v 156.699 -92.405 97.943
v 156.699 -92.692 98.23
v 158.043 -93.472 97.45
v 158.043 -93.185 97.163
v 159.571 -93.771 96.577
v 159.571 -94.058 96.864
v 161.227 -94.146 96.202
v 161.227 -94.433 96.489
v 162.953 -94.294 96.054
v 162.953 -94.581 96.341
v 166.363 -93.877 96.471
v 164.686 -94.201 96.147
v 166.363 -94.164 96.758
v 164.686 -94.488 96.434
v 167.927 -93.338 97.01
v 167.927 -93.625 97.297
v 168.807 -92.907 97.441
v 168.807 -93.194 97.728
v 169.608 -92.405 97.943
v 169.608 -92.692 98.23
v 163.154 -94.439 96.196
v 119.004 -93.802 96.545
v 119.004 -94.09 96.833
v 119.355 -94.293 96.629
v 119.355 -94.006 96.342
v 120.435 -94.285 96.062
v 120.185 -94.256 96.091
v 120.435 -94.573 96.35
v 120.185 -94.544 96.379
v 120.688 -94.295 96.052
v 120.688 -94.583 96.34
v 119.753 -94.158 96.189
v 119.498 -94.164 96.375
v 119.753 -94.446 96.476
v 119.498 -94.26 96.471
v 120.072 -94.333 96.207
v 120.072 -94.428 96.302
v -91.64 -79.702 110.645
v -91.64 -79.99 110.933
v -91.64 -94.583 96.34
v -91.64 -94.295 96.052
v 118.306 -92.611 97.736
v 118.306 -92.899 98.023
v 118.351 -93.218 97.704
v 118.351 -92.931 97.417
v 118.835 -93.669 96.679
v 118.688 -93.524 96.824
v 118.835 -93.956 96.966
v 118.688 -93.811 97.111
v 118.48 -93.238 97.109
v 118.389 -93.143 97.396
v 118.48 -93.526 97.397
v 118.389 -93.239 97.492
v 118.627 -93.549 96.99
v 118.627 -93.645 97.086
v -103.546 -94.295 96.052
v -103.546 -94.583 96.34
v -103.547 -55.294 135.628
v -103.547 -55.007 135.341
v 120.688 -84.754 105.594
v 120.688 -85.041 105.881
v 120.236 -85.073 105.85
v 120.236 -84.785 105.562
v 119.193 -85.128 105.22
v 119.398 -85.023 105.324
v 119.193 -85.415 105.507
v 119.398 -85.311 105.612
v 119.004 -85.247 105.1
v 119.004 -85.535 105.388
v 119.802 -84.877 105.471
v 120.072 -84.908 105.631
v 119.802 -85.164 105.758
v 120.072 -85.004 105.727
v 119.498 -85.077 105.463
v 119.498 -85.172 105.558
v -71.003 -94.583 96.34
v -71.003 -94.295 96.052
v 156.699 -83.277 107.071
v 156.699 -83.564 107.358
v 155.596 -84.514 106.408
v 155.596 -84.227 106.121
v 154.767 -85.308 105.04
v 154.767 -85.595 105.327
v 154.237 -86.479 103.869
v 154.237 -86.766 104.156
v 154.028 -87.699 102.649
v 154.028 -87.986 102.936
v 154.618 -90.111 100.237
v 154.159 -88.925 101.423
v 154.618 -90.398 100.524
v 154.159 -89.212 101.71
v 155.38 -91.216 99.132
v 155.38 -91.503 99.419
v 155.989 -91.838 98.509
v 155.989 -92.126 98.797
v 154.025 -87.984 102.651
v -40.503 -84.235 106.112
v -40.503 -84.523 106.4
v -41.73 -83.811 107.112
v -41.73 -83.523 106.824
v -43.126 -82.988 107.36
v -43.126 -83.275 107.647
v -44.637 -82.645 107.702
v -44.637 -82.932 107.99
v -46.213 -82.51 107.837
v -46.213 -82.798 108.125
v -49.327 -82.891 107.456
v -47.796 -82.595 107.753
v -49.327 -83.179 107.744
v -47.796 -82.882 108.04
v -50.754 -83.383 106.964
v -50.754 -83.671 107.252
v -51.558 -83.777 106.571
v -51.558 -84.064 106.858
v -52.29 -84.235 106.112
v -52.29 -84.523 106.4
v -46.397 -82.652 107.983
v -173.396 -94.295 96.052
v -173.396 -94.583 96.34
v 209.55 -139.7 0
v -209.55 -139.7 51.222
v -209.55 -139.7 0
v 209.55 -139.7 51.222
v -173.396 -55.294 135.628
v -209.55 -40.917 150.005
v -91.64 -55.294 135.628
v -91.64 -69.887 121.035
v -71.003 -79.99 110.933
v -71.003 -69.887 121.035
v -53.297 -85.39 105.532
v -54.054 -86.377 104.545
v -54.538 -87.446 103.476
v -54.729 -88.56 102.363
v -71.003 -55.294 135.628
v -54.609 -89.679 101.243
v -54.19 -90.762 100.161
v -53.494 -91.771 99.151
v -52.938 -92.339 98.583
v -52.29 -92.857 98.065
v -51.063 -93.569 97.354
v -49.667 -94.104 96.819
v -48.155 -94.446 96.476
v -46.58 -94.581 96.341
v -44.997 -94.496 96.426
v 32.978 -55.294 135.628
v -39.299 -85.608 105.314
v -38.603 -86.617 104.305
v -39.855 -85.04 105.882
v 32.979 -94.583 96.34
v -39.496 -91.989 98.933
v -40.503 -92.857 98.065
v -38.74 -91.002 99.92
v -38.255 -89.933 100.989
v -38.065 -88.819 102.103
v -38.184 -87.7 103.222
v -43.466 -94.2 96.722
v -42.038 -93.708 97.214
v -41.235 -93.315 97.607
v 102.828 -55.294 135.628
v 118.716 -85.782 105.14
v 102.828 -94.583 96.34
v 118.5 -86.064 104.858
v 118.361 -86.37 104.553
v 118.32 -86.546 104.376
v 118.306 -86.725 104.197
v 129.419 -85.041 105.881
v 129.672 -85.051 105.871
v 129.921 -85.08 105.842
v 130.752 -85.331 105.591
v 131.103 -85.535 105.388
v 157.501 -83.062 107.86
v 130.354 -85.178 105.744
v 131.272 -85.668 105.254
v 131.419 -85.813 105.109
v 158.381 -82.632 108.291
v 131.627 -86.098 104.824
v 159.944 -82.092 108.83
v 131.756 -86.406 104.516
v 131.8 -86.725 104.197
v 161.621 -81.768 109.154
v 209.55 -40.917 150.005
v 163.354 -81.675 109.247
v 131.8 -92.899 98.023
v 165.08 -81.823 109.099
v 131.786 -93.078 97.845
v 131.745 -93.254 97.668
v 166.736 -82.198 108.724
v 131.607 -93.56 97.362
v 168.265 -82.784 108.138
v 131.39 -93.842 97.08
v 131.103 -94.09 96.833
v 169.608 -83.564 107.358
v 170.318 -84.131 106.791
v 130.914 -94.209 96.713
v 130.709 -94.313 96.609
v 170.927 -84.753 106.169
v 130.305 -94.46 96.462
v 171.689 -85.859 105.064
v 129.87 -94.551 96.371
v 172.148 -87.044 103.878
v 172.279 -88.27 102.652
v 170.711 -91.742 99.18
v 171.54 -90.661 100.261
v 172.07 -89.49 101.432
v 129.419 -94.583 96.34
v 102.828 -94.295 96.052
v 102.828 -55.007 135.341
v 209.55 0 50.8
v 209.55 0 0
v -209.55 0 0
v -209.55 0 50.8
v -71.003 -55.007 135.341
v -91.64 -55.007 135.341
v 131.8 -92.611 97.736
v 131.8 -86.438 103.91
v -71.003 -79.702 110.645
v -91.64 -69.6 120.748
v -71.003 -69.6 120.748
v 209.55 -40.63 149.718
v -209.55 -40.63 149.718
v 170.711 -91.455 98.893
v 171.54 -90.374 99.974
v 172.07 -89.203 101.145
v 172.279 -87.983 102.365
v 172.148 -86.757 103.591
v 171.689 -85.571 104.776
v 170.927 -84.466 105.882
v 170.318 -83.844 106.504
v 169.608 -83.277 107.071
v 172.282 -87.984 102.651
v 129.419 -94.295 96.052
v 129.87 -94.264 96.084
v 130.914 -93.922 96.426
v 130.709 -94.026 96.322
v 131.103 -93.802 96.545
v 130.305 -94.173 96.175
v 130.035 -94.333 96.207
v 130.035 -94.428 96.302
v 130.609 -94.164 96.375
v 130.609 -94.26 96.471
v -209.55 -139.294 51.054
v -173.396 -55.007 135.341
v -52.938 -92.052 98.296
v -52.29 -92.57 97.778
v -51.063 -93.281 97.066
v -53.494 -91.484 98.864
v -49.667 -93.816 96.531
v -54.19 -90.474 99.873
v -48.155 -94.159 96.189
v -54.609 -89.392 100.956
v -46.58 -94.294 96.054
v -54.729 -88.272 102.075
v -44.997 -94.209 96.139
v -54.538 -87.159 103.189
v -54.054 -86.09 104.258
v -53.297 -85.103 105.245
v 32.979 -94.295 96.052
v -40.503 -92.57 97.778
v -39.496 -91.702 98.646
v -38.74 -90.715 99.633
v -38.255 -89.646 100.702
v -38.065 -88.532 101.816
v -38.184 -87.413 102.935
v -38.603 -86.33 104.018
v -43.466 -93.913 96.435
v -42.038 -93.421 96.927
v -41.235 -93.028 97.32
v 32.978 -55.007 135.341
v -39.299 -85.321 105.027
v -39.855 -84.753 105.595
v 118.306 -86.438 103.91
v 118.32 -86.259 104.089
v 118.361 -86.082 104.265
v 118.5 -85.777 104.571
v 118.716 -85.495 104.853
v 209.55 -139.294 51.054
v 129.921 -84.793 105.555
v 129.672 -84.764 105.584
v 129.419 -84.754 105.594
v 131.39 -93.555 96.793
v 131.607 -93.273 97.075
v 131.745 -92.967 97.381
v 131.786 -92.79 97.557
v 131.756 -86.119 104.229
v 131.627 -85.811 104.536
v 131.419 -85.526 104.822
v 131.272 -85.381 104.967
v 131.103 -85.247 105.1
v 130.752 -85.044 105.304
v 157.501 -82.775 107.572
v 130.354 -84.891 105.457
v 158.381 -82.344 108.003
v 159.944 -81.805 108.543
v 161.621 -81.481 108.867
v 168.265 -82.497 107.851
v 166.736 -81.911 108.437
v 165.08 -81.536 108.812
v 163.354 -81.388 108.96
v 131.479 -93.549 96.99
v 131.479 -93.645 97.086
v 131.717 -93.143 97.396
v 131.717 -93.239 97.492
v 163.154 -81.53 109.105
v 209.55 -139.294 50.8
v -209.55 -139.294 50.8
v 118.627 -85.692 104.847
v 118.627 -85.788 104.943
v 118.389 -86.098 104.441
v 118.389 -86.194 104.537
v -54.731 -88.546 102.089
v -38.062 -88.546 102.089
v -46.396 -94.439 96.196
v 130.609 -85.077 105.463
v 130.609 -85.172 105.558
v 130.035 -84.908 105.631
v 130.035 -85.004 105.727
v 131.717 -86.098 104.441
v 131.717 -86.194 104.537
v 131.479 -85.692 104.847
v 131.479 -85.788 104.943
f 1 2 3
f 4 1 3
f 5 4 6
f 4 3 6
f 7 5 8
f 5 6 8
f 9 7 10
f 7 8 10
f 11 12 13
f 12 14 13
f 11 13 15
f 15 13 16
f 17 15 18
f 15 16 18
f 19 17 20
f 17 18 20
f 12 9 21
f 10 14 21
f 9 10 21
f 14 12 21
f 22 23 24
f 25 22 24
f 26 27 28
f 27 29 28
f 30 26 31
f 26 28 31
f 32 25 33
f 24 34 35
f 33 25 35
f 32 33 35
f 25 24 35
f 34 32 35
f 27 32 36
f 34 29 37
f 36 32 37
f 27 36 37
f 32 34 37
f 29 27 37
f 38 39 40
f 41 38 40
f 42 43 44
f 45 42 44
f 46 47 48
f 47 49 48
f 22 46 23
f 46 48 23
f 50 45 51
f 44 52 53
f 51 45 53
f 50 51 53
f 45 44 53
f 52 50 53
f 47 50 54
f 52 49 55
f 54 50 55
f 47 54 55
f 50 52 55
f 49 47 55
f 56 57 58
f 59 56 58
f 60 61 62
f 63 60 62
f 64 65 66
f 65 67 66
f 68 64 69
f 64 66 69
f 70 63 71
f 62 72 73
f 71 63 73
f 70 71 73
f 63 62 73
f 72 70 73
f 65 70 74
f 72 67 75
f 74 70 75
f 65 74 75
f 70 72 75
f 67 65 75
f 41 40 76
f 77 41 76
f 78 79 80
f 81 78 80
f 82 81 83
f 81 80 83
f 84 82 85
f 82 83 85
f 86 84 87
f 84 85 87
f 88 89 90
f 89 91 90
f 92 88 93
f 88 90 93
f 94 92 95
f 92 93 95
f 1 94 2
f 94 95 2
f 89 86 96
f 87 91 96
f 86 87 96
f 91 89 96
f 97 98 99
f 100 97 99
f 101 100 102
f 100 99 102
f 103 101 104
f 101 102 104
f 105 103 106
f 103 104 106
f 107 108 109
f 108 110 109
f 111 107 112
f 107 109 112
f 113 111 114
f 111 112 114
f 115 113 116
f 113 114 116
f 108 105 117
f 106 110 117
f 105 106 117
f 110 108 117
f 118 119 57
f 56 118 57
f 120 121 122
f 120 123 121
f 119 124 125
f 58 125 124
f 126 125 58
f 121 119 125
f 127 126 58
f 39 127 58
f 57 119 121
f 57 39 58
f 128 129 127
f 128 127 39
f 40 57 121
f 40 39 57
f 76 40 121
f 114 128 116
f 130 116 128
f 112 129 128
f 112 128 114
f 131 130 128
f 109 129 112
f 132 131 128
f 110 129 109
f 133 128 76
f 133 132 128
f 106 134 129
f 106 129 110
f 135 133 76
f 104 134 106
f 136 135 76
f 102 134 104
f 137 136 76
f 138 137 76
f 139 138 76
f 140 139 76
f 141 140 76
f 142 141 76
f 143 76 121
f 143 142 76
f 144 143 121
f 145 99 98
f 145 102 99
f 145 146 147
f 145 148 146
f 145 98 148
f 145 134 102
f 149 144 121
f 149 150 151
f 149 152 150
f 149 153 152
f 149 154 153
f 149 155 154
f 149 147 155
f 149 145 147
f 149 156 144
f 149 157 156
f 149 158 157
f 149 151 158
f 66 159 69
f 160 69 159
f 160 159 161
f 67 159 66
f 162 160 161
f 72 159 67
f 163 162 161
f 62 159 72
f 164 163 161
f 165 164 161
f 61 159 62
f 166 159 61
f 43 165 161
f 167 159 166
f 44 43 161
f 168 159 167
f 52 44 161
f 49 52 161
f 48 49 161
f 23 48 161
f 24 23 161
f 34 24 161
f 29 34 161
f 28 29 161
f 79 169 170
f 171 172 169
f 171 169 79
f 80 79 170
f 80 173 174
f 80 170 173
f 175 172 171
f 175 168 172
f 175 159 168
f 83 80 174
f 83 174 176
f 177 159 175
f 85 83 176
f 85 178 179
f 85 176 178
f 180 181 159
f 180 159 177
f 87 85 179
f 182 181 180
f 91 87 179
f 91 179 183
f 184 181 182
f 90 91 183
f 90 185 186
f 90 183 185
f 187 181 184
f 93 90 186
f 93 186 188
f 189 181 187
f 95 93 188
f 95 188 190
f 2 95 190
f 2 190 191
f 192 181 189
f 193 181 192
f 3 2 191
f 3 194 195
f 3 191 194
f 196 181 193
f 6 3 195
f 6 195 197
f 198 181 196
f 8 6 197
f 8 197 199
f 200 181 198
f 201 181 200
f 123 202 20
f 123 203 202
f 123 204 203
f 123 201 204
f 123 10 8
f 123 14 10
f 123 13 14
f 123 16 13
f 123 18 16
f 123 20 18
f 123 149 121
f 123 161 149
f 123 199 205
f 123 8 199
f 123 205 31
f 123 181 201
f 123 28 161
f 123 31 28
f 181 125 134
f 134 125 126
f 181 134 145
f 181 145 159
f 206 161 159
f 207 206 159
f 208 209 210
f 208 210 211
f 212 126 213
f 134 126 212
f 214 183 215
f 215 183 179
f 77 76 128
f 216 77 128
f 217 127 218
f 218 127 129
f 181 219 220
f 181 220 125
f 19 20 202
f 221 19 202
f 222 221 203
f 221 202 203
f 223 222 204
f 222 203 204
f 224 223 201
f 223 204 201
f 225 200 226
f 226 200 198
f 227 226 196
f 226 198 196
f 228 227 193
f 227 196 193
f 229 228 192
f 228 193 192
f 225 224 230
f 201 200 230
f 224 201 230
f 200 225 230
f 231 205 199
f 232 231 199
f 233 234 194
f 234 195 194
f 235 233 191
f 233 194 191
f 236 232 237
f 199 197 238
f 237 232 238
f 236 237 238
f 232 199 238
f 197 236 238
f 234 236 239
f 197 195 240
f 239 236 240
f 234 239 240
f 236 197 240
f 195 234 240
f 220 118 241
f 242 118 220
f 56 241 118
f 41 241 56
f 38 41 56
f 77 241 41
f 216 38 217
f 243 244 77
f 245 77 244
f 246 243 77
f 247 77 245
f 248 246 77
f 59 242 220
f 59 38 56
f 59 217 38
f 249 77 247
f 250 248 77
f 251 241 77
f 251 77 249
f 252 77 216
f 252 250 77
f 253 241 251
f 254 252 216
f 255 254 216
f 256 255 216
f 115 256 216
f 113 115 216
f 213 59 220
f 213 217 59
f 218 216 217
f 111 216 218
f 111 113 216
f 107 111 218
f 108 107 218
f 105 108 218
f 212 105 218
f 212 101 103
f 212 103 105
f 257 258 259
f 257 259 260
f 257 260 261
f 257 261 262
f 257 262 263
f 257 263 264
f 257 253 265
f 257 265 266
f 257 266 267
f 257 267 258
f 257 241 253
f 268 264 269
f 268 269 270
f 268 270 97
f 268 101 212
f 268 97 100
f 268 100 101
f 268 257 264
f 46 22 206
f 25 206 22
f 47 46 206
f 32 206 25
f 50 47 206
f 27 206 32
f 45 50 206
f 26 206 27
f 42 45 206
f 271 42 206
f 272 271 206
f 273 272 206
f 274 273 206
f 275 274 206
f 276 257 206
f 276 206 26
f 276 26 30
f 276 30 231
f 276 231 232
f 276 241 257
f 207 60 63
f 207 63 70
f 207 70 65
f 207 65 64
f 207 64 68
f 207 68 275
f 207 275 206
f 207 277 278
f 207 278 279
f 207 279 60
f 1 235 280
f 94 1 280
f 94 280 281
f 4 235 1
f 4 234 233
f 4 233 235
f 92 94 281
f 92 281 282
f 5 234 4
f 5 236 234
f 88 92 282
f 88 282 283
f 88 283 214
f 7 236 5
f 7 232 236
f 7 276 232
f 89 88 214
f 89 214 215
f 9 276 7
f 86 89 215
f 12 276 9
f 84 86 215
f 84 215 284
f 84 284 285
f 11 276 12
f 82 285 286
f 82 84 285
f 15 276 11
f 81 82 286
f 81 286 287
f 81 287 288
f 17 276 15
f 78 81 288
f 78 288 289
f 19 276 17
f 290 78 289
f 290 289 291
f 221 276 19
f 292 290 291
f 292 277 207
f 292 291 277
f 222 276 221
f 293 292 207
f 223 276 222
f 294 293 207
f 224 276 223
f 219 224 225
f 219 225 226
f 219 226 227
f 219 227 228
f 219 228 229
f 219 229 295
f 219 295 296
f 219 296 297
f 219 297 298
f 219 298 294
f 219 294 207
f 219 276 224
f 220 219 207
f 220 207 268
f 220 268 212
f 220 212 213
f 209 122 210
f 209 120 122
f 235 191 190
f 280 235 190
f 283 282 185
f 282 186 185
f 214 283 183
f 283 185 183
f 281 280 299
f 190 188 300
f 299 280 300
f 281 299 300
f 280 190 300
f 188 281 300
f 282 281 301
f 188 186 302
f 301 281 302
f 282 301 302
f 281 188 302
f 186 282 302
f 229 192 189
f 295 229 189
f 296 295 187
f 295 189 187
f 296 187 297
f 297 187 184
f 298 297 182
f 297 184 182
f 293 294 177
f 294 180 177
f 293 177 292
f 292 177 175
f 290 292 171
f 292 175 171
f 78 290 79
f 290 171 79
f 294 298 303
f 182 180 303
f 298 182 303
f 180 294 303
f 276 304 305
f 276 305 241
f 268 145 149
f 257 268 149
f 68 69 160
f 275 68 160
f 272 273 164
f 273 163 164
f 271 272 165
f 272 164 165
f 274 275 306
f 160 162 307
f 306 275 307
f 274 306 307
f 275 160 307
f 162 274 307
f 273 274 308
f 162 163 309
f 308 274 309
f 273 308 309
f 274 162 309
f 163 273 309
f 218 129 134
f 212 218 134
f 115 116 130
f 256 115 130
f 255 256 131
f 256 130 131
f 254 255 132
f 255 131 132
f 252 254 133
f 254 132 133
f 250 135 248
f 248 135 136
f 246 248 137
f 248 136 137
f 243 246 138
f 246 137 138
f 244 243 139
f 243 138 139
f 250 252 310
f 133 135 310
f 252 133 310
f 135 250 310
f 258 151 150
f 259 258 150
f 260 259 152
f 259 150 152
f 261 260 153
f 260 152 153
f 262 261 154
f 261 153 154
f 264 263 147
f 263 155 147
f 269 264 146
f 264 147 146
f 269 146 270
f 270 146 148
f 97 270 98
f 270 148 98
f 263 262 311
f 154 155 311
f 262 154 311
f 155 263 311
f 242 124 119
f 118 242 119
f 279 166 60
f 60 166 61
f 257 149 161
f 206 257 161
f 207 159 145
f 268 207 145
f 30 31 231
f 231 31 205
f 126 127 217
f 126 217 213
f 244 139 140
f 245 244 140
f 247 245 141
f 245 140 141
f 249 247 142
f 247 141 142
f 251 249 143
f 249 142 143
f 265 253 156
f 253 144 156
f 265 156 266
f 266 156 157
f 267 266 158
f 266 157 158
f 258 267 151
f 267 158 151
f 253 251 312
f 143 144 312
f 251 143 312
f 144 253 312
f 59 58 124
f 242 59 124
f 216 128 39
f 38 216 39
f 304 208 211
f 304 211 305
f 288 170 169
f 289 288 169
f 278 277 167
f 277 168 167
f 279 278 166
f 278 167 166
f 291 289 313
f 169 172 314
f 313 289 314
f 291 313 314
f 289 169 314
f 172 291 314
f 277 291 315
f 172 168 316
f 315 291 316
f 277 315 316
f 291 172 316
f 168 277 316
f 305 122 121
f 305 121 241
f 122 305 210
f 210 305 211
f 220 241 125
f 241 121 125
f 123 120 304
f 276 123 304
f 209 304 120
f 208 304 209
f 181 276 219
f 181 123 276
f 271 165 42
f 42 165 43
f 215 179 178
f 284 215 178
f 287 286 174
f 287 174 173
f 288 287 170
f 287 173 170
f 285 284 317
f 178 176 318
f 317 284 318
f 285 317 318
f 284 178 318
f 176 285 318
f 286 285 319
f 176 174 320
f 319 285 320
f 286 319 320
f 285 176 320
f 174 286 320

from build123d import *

# Parameters (mm, degrees)
F1_DEPTH = 209.55
F2_W     = 20.6375
F2_H     = 20.6375
F3_DEPTH = 0.4064


# Not quite as in the source:
# - the dataset's text gives a spline's control points without its knots; the knots are read off the source's solid


with BuildPart() as f1:
    # F0 (on Right) → F1 (new body, symmetric)
    with BuildSketch(Plane.YZ):
        Polygon((-139.7, 0), (0, 0), (0, 50.8), (-139.2936, 50.8), (-139.2936, 51.054), (-40.6298144724, 149.7177855276), (-40.9171826682, 150.0051537235), (-139.7, 51.2223363917), align=None)
    extrude(amount=F1_DEPTH, both=True)

    # F2 (on face) → F3 (cut, through all)
    with BuildSketch(Plane(origin=(0, -95.4611681959, 95.4611681959), x_dir=(1, 0, 0), z_dir=(0, -0.7071067812, 0.7071067812))):
        with BuildLine():
            add(Edge.make_bspline(
                [(119.0042372245, 14.038217476), (118.5632678245, 13.597959276), (118.3062706245, 12.977818276), (118.3062706245, 12.354959476)],
                knots=[1, 1, 1, 1, 2, 2, 2, 2], degree=3))
            Line((118.3062706245, 12.354959476), (118.3062706245, 3.623684076))
            add(Edge.make_bspline(
                [(118.3062706245, 3.623684076), (118.3062706245, 3.000114076), (118.5632678245, 2.380023876), (119.0042372245, 1.939740276)],
                knots=[0, 0, 0, 0, 1, 1, 1, 1], degree=3))
            add(Edge.make_bspline(
                [(119.0042372245, 1.939740276), (119.4445462245, 1.498770876), (120.0646618245, 1.242434076), (120.6875206245, 1.242434076)],
                knots=[1, 1, 1, 1, 2, 2, 2, 2], degree=3))
            Line((120.6875206245, 1.242434076), (129.4187706245, 1.242434076))
            add(Edge.make_bspline(
                [(129.4187706245, 1.242434076), (130.0423406245, 1.242434076), (130.6624562245, 1.498770876), (131.1027144245, 1.939740276)],
                knots=[0, 0, 0, 0, 1, 1, 1, 1], degree=3))
            add(Edge.make_bspline(
                [(131.1027144245, 1.939740276), (131.5436838245, 2.380023876), (131.8000206245, 3.000114076), (131.8000206245, 3.623684076)],
                knots=[1, 1, 1, 1, 2, 2, 2, 2], degree=3))
            Line((131.8000206245, 3.623684076), (131.8000206245, 12.354959476))
            add(Edge.make_bspline(
                [(131.8000206245, 12.354959476), (131.8000206245, 12.977818276), (131.5436838245, 13.597959276), (131.1027144245, 14.038217476)],
                knots=[0, 0, 0, 0, 1, 1, 1, 1], degree=3))
            add(Edge.make_bspline(
                [(131.1027144245, 14.038217476), (130.6624562245, 14.479186876), (130.0423406245, 14.736209476), (129.4187706245, 14.736209476)],
                knots=[1, 1, 1, 1, 2, 2, 2, 2], degree=3))
            Line((129.4187706245, 14.736209476), (120.6875206245, 14.736209476))
            add(Edge.make_bspline(
                [(120.6875206245, 14.736209476), (120.0646618245, 14.736209476), (119.4445462245, 14.479186876), (119.0042372245, 14.038217476)],
                knots=[0, 0, 0, 0, 1, 1, 1, 1], degree=3))
        make_face()
        Polygon((-173.3964987755, 56.804959476), (-173.3964987755, 1.242434076), (-103.5464987755, 1.242434076), (-103.5466765755, 56.804959476), align=None)
        Polygon((-91.6402487755, 1.242434076), (-71.0027487755, 1.242434076), (-71.0029265755, 21.879959476), (-91.6404265755, 21.879959476), align=None)
        with Locations((-81.3216765755, 46.486209476)):
            Rectangle(F2_W, F2_H)
        Polygon((32.9785012245, 1.242434076), (102.8281456245, 1.242434076), (102.8281456245, 56.804959476), (32.9781456245, 56.804959476), align=None)
        with BuildLine():
            add(Edge.make_bspline(
                [(-40.5029875755, 15.469304276), (-42.0462153755, 17.012709876), (-44.2145625755, 17.911209476), (-46.3966765755, 17.911209476)],
                knots=[7, 7, 7, 7, 8, 8, 8, 8], degree=3))
            add(Edge.make_bspline(
                [(-46.3966765755, 17.911209476), (-48.5784603755, 17.911209476), (-50.7468075755, 17.012709876), (-52.2898575755, 15.469304276)],
                knots=[0, 0, 0, 0, 1, 1, 1, 1], degree=3))
            add(Edge.make_bspline(
                [(-52.2898575755, 15.469304276), (-53.8329075755, 13.926609876), (-54.7310515755, 11.758262676), (-54.7310515755, 9.576834476), (-54.7310515755, 7.394720476), (-53.8327297755, 5.226373276), (-52.2896797755, 3.682967676)],
                knots=[1, 1, 1, 1, 2, 2, 2, 3, 3, 3, 3], degree=3))
            add(Edge.make_bspline(
                [(-52.2896797755, 3.682967676), (-50.7466297755, 2.140222476), (-48.5782825755, 1.242434076), (-46.3964987755, 1.242434076), (-44.2143847755, 1.242434076), (-42.0460375755, 2.140222476), (-40.5029875755, 3.682967676)],
                knots=[3, 3, 3, 3, 4, 4, 4, 5, 5, 5, 5], degree=3))
            add(Edge.make_bspline(
                [(-40.5029875755, 3.682967676), (-38.9602677755, 5.226373276), (-38.0624793755, 7.394720476), (-38.0624793755, 9.576834476), (-38.0624793755, 11.758262676), (-38.9602677755, 13.926609876), (-40.5029875755, 15.469304276)],
                knots=[5, 5, 5, 5, 6, 6, 6, 7, 7, 7, 7], degree=3))
        make_face()
        with BuildLine():
            add(Edge.make_bspline(
                [(169.6082508245, 16.824597476), (167.9183888245, 18.514789676), (165.5433618245, 19.498709476), (163.1535012245, 19.498709476)],
                knots=[7, 7, 7, 7, 8, 8, 8, 8], degree=3))
            add(Edge.make_bspline(
                [(163.1535012245, 19.498709476), (160.7636406245, 19.498709476), (158.3889184245, 18.514789676), (156.6991072245, 16.824597476)],
                knots=[0, 0, 0, 0, 1, 1, 1, 1], degree=3))
            add(Edge.make_bspline(
                [(156.6991072245, 16.824597476), (155.0092706245, 15.135141876), (154.0253762245, 12.760114876), (154.0253762245, 10.370584476), (154.0253762245, 7.980368276), (155.0092706245, 5.605315876), (156.6991072245, 3.915834876)],
                knots=[1, 1, 1, 1, 2, 2, 2, 3, 3, 3, 3], degree=3))
            add(Edge.make_bspline(
                [(156.6991072245, 3.915834876), (158.3889184245, 2.225668076), (160.7636406245, 1.242434076), (163.1535012245, 1.242434076), (165.5433618245, 1.242434076), (167.9183888245, 2.225668076), (169.6082508245, 3.915834876)],
                knots=[3, 3, 3, 3, 4, 4, 4, 5, 5, 5, 5], degree=3))
            add(Edge.make_bspline(
                [(169.6082508245, 3.915834876), (171.2980366245, 5.605315876), (172.2816262245, 7.980368276), (172.2816262245, 10.370584476), (172.2816262245, 12.760114876), (171.2980366245, 15.135141876), (169.6082508245, 16.824597476)],
                knots=[5, 5, 5, 5, 6, 6, 6, 7, 7, 7, 7], degree=3))
        make_face()
    extrude(amount=-F3_DEPTH, mode=Mode.SUBTRACT)


solid = f1.part
